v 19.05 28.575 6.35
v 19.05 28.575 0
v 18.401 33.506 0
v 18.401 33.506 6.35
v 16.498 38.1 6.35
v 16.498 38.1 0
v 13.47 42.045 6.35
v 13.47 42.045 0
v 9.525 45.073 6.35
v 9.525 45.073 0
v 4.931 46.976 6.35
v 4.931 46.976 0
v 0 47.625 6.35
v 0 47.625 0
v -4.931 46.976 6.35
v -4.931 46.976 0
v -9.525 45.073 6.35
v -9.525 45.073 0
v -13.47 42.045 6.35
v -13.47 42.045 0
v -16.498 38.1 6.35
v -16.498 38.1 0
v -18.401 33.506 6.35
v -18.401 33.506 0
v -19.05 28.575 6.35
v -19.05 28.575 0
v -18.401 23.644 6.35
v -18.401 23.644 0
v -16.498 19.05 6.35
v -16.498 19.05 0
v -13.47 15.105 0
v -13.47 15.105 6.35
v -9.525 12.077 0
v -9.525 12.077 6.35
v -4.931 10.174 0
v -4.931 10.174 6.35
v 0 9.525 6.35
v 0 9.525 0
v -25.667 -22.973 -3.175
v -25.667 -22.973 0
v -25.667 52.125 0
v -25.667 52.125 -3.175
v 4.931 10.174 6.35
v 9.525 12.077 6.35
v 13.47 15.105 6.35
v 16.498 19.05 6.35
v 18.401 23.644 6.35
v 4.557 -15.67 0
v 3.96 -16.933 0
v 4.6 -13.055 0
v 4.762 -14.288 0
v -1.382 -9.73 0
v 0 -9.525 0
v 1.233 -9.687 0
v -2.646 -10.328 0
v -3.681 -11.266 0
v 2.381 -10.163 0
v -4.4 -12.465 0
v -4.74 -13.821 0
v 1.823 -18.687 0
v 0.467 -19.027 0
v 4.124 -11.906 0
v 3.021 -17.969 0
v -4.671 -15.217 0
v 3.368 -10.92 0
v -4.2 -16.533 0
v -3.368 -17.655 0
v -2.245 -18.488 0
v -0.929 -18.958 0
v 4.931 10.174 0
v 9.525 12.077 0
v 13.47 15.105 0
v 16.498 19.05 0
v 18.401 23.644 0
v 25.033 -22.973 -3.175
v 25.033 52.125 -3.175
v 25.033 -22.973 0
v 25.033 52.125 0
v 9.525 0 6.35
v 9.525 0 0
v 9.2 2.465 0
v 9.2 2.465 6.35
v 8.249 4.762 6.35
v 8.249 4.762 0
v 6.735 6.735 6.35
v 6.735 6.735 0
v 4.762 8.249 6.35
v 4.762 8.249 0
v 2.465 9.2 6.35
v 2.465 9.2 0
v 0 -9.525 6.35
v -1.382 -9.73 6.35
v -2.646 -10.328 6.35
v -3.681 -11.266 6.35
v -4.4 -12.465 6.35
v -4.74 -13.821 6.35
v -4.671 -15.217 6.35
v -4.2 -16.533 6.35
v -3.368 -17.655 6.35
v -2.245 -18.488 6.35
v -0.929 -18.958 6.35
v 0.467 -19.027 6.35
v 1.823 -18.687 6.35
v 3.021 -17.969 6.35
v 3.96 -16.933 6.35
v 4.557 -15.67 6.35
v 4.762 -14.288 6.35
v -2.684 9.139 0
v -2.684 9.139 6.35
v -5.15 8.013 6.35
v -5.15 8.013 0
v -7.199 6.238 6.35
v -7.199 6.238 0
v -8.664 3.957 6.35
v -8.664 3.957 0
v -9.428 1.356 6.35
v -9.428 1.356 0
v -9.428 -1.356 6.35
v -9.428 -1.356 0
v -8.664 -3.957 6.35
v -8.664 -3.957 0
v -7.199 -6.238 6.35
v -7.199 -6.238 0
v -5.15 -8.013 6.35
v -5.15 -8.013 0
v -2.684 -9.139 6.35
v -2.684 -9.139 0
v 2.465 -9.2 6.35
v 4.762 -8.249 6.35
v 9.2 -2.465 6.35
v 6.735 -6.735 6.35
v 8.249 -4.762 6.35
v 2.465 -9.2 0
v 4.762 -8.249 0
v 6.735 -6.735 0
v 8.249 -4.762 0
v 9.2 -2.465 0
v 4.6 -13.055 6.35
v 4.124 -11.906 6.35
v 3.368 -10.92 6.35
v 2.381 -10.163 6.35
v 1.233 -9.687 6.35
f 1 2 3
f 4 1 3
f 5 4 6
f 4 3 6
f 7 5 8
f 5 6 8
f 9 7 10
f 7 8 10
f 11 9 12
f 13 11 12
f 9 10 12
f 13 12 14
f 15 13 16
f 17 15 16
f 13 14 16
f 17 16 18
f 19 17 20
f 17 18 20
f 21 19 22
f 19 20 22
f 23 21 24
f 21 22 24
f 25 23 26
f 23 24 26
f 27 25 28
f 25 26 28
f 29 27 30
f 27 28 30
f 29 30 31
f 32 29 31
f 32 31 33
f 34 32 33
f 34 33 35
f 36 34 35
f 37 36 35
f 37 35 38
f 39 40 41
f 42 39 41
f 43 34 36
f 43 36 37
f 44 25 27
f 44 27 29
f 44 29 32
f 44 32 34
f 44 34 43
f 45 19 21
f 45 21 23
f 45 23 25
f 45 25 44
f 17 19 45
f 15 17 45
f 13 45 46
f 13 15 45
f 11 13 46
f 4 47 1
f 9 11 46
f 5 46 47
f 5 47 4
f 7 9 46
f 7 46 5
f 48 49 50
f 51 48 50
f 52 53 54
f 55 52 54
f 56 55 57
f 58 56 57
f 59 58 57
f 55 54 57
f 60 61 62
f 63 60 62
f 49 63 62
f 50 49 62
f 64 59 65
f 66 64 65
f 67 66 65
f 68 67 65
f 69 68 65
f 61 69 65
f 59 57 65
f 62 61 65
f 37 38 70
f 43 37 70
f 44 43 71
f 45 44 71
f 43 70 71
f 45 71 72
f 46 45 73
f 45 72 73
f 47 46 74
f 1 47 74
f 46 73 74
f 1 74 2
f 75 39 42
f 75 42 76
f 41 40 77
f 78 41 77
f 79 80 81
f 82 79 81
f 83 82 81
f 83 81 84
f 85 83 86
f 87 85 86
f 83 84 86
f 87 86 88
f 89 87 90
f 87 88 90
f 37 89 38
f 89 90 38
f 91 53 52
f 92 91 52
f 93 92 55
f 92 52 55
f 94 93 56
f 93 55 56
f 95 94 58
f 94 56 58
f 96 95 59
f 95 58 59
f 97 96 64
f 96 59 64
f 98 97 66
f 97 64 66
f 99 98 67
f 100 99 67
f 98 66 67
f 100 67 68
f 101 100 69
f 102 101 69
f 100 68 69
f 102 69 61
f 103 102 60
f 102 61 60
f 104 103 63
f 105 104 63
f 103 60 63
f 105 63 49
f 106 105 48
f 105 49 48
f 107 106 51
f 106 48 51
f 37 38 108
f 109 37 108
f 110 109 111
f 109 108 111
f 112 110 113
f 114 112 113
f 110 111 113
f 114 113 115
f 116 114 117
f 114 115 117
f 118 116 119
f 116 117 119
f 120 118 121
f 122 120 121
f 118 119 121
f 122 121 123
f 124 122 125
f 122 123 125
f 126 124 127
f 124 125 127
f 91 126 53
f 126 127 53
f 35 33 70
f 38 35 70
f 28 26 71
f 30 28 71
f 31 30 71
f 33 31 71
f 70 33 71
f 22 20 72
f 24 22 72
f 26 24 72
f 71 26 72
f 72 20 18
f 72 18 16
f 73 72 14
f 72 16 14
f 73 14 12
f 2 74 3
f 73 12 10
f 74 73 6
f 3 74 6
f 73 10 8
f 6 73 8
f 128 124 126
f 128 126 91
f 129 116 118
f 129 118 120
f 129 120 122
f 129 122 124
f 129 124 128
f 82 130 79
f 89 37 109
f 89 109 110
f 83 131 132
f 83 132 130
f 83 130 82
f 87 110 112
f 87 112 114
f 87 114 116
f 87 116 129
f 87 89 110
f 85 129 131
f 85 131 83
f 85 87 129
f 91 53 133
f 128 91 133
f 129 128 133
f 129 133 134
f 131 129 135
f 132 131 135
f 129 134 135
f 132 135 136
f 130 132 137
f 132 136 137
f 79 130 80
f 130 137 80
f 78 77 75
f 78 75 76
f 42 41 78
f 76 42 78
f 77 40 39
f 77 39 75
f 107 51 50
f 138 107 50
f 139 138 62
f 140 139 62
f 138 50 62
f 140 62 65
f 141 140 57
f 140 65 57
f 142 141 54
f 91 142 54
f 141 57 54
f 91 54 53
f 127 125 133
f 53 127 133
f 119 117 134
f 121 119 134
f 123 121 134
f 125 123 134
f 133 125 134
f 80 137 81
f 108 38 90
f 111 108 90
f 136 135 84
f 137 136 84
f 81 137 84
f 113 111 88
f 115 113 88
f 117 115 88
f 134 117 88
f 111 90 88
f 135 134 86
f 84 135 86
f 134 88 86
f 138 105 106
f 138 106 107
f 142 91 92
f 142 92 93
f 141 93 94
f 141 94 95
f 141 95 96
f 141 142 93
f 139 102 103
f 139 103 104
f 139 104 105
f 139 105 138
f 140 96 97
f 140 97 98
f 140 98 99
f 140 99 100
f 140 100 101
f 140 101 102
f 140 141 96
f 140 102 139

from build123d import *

# Parameters (mm, degrees)
F1_DEPTH = 6.35
F2_DEPTH = 6.35
F3_DEPTH = 6.35
F0_W     = 50.699405
F0_H     = 75.098496
F4_DEPTH = 3.175


with BuildPart() as f1:
    # F0 (on Top) → F1 (new body)
    with BuildSketch(Plane.XY):
        with BuildLine():
            ThreePointArc((19.05, 28.575), (-13.470384, 42.045384), (0, 9.525))
            ThreePointArc((0, 9.525), (13.470384, 15.104616), (19.05, 28.575))
        make_face()
    extrude(amount=F1_DEPTH)


with BuildPart() as f2:
    # F0 (on Top) → F2 (new body)
    with BuildSketch(Plane.XY):
        with BuildLine():
            ThreePointArc((0, -9.525), (6.735192, -6.735192), (9.525, 0))
            ThreePointArc((9.525, 0), (6.735192, 6.735192), (0, 9.525))
            ThreePointArc((0, 9.525), (-9.525, 0), (0, -9.525))
        make_face()
    extrude(amount=F2_DEPTH)


with BuildPart() as f3:
    # F0 (on Top) → F3 (new body)
    with BuildSketch(Plane.XY):
        with BuildLine():
            ThreePointArc((4.7625, -14.2875), (3.367596, -10.919904), (0, -9.525))
            ThreePointArc((0, -9.525), (-3.367596, -17.655096), (4.7625, -14.2875))
        make_face()
    extrude(amount=F3_DEPTH)


with BuildPart() as f4:
    # F0 (on Top) → F4 (new body)
    with BuildSketch(Plane.XY):
        with Locations((-0.316871, 14.576079)):
            Rectangle(F0_W, F0_H)
        with BuildLine():
            ThreePointArc((4.7625, -14.2875), (-3.367596, -17.655096), (0, -9.525))
            ThreePointArc((0, -9.525), (3.367596, -10.919904), (4.7625, -14.2875))
        make_face(mode=Mode.SUBTRACT)
        with BuildLine():
            ThreePointArc((0, 9.525), (6.735192, 6.735192), (9.525, 0))
            ThreePointArc((9.525, 0), (6.735192, -6.735192), (0, -9.525))
            ThreePointArc((0, -9.525), (-9.525, 0), (0, 9.525))
        make_face(mode=Mode.SUBTRACT)
        with BuildLine():
            ThreePointArc((19.05, 28.575), (13.470384, 15.104616), (0, 9.525))
            ThreePointArc((0, 9.525), (-13.470384, 42.045384), (19.05, 28.575))
        make_face(mode=Mode.SUBTRACT)
        with BuildLine():
            ThreePointArc((19.05, 28.575), (-13.470384, 42.045384), (0, 9.525))
            ThreePointArc((0, 9.525), (13.470384, 15.104616), (19.05, 28.575))
        make_face()
        with BuildLine():
            ThreePointArc((0, -9.525), (6.735192, -6.735192), (9.525, 0))
            ThreePointArc((9.525, 0), (6.735192, 6.735192), (0, 9.525))
            ThreePointArc((0, 9.525), (-9.525, 0), (0, -9.525))
        make_face()
        with BuildLine():
            ThreePointArc((4.7625, -14.2875), (3.367596, -10.919904), (0, -9.525))
            ThreePointArc((0, -9.525), (-3.367596, -17.655096), (4.7625, -14.2875))
        make_face()
    extrude(amount=-F4_DEPTH)


solid = Compound([f1.part, f2.part, f3.part, f4.part])
